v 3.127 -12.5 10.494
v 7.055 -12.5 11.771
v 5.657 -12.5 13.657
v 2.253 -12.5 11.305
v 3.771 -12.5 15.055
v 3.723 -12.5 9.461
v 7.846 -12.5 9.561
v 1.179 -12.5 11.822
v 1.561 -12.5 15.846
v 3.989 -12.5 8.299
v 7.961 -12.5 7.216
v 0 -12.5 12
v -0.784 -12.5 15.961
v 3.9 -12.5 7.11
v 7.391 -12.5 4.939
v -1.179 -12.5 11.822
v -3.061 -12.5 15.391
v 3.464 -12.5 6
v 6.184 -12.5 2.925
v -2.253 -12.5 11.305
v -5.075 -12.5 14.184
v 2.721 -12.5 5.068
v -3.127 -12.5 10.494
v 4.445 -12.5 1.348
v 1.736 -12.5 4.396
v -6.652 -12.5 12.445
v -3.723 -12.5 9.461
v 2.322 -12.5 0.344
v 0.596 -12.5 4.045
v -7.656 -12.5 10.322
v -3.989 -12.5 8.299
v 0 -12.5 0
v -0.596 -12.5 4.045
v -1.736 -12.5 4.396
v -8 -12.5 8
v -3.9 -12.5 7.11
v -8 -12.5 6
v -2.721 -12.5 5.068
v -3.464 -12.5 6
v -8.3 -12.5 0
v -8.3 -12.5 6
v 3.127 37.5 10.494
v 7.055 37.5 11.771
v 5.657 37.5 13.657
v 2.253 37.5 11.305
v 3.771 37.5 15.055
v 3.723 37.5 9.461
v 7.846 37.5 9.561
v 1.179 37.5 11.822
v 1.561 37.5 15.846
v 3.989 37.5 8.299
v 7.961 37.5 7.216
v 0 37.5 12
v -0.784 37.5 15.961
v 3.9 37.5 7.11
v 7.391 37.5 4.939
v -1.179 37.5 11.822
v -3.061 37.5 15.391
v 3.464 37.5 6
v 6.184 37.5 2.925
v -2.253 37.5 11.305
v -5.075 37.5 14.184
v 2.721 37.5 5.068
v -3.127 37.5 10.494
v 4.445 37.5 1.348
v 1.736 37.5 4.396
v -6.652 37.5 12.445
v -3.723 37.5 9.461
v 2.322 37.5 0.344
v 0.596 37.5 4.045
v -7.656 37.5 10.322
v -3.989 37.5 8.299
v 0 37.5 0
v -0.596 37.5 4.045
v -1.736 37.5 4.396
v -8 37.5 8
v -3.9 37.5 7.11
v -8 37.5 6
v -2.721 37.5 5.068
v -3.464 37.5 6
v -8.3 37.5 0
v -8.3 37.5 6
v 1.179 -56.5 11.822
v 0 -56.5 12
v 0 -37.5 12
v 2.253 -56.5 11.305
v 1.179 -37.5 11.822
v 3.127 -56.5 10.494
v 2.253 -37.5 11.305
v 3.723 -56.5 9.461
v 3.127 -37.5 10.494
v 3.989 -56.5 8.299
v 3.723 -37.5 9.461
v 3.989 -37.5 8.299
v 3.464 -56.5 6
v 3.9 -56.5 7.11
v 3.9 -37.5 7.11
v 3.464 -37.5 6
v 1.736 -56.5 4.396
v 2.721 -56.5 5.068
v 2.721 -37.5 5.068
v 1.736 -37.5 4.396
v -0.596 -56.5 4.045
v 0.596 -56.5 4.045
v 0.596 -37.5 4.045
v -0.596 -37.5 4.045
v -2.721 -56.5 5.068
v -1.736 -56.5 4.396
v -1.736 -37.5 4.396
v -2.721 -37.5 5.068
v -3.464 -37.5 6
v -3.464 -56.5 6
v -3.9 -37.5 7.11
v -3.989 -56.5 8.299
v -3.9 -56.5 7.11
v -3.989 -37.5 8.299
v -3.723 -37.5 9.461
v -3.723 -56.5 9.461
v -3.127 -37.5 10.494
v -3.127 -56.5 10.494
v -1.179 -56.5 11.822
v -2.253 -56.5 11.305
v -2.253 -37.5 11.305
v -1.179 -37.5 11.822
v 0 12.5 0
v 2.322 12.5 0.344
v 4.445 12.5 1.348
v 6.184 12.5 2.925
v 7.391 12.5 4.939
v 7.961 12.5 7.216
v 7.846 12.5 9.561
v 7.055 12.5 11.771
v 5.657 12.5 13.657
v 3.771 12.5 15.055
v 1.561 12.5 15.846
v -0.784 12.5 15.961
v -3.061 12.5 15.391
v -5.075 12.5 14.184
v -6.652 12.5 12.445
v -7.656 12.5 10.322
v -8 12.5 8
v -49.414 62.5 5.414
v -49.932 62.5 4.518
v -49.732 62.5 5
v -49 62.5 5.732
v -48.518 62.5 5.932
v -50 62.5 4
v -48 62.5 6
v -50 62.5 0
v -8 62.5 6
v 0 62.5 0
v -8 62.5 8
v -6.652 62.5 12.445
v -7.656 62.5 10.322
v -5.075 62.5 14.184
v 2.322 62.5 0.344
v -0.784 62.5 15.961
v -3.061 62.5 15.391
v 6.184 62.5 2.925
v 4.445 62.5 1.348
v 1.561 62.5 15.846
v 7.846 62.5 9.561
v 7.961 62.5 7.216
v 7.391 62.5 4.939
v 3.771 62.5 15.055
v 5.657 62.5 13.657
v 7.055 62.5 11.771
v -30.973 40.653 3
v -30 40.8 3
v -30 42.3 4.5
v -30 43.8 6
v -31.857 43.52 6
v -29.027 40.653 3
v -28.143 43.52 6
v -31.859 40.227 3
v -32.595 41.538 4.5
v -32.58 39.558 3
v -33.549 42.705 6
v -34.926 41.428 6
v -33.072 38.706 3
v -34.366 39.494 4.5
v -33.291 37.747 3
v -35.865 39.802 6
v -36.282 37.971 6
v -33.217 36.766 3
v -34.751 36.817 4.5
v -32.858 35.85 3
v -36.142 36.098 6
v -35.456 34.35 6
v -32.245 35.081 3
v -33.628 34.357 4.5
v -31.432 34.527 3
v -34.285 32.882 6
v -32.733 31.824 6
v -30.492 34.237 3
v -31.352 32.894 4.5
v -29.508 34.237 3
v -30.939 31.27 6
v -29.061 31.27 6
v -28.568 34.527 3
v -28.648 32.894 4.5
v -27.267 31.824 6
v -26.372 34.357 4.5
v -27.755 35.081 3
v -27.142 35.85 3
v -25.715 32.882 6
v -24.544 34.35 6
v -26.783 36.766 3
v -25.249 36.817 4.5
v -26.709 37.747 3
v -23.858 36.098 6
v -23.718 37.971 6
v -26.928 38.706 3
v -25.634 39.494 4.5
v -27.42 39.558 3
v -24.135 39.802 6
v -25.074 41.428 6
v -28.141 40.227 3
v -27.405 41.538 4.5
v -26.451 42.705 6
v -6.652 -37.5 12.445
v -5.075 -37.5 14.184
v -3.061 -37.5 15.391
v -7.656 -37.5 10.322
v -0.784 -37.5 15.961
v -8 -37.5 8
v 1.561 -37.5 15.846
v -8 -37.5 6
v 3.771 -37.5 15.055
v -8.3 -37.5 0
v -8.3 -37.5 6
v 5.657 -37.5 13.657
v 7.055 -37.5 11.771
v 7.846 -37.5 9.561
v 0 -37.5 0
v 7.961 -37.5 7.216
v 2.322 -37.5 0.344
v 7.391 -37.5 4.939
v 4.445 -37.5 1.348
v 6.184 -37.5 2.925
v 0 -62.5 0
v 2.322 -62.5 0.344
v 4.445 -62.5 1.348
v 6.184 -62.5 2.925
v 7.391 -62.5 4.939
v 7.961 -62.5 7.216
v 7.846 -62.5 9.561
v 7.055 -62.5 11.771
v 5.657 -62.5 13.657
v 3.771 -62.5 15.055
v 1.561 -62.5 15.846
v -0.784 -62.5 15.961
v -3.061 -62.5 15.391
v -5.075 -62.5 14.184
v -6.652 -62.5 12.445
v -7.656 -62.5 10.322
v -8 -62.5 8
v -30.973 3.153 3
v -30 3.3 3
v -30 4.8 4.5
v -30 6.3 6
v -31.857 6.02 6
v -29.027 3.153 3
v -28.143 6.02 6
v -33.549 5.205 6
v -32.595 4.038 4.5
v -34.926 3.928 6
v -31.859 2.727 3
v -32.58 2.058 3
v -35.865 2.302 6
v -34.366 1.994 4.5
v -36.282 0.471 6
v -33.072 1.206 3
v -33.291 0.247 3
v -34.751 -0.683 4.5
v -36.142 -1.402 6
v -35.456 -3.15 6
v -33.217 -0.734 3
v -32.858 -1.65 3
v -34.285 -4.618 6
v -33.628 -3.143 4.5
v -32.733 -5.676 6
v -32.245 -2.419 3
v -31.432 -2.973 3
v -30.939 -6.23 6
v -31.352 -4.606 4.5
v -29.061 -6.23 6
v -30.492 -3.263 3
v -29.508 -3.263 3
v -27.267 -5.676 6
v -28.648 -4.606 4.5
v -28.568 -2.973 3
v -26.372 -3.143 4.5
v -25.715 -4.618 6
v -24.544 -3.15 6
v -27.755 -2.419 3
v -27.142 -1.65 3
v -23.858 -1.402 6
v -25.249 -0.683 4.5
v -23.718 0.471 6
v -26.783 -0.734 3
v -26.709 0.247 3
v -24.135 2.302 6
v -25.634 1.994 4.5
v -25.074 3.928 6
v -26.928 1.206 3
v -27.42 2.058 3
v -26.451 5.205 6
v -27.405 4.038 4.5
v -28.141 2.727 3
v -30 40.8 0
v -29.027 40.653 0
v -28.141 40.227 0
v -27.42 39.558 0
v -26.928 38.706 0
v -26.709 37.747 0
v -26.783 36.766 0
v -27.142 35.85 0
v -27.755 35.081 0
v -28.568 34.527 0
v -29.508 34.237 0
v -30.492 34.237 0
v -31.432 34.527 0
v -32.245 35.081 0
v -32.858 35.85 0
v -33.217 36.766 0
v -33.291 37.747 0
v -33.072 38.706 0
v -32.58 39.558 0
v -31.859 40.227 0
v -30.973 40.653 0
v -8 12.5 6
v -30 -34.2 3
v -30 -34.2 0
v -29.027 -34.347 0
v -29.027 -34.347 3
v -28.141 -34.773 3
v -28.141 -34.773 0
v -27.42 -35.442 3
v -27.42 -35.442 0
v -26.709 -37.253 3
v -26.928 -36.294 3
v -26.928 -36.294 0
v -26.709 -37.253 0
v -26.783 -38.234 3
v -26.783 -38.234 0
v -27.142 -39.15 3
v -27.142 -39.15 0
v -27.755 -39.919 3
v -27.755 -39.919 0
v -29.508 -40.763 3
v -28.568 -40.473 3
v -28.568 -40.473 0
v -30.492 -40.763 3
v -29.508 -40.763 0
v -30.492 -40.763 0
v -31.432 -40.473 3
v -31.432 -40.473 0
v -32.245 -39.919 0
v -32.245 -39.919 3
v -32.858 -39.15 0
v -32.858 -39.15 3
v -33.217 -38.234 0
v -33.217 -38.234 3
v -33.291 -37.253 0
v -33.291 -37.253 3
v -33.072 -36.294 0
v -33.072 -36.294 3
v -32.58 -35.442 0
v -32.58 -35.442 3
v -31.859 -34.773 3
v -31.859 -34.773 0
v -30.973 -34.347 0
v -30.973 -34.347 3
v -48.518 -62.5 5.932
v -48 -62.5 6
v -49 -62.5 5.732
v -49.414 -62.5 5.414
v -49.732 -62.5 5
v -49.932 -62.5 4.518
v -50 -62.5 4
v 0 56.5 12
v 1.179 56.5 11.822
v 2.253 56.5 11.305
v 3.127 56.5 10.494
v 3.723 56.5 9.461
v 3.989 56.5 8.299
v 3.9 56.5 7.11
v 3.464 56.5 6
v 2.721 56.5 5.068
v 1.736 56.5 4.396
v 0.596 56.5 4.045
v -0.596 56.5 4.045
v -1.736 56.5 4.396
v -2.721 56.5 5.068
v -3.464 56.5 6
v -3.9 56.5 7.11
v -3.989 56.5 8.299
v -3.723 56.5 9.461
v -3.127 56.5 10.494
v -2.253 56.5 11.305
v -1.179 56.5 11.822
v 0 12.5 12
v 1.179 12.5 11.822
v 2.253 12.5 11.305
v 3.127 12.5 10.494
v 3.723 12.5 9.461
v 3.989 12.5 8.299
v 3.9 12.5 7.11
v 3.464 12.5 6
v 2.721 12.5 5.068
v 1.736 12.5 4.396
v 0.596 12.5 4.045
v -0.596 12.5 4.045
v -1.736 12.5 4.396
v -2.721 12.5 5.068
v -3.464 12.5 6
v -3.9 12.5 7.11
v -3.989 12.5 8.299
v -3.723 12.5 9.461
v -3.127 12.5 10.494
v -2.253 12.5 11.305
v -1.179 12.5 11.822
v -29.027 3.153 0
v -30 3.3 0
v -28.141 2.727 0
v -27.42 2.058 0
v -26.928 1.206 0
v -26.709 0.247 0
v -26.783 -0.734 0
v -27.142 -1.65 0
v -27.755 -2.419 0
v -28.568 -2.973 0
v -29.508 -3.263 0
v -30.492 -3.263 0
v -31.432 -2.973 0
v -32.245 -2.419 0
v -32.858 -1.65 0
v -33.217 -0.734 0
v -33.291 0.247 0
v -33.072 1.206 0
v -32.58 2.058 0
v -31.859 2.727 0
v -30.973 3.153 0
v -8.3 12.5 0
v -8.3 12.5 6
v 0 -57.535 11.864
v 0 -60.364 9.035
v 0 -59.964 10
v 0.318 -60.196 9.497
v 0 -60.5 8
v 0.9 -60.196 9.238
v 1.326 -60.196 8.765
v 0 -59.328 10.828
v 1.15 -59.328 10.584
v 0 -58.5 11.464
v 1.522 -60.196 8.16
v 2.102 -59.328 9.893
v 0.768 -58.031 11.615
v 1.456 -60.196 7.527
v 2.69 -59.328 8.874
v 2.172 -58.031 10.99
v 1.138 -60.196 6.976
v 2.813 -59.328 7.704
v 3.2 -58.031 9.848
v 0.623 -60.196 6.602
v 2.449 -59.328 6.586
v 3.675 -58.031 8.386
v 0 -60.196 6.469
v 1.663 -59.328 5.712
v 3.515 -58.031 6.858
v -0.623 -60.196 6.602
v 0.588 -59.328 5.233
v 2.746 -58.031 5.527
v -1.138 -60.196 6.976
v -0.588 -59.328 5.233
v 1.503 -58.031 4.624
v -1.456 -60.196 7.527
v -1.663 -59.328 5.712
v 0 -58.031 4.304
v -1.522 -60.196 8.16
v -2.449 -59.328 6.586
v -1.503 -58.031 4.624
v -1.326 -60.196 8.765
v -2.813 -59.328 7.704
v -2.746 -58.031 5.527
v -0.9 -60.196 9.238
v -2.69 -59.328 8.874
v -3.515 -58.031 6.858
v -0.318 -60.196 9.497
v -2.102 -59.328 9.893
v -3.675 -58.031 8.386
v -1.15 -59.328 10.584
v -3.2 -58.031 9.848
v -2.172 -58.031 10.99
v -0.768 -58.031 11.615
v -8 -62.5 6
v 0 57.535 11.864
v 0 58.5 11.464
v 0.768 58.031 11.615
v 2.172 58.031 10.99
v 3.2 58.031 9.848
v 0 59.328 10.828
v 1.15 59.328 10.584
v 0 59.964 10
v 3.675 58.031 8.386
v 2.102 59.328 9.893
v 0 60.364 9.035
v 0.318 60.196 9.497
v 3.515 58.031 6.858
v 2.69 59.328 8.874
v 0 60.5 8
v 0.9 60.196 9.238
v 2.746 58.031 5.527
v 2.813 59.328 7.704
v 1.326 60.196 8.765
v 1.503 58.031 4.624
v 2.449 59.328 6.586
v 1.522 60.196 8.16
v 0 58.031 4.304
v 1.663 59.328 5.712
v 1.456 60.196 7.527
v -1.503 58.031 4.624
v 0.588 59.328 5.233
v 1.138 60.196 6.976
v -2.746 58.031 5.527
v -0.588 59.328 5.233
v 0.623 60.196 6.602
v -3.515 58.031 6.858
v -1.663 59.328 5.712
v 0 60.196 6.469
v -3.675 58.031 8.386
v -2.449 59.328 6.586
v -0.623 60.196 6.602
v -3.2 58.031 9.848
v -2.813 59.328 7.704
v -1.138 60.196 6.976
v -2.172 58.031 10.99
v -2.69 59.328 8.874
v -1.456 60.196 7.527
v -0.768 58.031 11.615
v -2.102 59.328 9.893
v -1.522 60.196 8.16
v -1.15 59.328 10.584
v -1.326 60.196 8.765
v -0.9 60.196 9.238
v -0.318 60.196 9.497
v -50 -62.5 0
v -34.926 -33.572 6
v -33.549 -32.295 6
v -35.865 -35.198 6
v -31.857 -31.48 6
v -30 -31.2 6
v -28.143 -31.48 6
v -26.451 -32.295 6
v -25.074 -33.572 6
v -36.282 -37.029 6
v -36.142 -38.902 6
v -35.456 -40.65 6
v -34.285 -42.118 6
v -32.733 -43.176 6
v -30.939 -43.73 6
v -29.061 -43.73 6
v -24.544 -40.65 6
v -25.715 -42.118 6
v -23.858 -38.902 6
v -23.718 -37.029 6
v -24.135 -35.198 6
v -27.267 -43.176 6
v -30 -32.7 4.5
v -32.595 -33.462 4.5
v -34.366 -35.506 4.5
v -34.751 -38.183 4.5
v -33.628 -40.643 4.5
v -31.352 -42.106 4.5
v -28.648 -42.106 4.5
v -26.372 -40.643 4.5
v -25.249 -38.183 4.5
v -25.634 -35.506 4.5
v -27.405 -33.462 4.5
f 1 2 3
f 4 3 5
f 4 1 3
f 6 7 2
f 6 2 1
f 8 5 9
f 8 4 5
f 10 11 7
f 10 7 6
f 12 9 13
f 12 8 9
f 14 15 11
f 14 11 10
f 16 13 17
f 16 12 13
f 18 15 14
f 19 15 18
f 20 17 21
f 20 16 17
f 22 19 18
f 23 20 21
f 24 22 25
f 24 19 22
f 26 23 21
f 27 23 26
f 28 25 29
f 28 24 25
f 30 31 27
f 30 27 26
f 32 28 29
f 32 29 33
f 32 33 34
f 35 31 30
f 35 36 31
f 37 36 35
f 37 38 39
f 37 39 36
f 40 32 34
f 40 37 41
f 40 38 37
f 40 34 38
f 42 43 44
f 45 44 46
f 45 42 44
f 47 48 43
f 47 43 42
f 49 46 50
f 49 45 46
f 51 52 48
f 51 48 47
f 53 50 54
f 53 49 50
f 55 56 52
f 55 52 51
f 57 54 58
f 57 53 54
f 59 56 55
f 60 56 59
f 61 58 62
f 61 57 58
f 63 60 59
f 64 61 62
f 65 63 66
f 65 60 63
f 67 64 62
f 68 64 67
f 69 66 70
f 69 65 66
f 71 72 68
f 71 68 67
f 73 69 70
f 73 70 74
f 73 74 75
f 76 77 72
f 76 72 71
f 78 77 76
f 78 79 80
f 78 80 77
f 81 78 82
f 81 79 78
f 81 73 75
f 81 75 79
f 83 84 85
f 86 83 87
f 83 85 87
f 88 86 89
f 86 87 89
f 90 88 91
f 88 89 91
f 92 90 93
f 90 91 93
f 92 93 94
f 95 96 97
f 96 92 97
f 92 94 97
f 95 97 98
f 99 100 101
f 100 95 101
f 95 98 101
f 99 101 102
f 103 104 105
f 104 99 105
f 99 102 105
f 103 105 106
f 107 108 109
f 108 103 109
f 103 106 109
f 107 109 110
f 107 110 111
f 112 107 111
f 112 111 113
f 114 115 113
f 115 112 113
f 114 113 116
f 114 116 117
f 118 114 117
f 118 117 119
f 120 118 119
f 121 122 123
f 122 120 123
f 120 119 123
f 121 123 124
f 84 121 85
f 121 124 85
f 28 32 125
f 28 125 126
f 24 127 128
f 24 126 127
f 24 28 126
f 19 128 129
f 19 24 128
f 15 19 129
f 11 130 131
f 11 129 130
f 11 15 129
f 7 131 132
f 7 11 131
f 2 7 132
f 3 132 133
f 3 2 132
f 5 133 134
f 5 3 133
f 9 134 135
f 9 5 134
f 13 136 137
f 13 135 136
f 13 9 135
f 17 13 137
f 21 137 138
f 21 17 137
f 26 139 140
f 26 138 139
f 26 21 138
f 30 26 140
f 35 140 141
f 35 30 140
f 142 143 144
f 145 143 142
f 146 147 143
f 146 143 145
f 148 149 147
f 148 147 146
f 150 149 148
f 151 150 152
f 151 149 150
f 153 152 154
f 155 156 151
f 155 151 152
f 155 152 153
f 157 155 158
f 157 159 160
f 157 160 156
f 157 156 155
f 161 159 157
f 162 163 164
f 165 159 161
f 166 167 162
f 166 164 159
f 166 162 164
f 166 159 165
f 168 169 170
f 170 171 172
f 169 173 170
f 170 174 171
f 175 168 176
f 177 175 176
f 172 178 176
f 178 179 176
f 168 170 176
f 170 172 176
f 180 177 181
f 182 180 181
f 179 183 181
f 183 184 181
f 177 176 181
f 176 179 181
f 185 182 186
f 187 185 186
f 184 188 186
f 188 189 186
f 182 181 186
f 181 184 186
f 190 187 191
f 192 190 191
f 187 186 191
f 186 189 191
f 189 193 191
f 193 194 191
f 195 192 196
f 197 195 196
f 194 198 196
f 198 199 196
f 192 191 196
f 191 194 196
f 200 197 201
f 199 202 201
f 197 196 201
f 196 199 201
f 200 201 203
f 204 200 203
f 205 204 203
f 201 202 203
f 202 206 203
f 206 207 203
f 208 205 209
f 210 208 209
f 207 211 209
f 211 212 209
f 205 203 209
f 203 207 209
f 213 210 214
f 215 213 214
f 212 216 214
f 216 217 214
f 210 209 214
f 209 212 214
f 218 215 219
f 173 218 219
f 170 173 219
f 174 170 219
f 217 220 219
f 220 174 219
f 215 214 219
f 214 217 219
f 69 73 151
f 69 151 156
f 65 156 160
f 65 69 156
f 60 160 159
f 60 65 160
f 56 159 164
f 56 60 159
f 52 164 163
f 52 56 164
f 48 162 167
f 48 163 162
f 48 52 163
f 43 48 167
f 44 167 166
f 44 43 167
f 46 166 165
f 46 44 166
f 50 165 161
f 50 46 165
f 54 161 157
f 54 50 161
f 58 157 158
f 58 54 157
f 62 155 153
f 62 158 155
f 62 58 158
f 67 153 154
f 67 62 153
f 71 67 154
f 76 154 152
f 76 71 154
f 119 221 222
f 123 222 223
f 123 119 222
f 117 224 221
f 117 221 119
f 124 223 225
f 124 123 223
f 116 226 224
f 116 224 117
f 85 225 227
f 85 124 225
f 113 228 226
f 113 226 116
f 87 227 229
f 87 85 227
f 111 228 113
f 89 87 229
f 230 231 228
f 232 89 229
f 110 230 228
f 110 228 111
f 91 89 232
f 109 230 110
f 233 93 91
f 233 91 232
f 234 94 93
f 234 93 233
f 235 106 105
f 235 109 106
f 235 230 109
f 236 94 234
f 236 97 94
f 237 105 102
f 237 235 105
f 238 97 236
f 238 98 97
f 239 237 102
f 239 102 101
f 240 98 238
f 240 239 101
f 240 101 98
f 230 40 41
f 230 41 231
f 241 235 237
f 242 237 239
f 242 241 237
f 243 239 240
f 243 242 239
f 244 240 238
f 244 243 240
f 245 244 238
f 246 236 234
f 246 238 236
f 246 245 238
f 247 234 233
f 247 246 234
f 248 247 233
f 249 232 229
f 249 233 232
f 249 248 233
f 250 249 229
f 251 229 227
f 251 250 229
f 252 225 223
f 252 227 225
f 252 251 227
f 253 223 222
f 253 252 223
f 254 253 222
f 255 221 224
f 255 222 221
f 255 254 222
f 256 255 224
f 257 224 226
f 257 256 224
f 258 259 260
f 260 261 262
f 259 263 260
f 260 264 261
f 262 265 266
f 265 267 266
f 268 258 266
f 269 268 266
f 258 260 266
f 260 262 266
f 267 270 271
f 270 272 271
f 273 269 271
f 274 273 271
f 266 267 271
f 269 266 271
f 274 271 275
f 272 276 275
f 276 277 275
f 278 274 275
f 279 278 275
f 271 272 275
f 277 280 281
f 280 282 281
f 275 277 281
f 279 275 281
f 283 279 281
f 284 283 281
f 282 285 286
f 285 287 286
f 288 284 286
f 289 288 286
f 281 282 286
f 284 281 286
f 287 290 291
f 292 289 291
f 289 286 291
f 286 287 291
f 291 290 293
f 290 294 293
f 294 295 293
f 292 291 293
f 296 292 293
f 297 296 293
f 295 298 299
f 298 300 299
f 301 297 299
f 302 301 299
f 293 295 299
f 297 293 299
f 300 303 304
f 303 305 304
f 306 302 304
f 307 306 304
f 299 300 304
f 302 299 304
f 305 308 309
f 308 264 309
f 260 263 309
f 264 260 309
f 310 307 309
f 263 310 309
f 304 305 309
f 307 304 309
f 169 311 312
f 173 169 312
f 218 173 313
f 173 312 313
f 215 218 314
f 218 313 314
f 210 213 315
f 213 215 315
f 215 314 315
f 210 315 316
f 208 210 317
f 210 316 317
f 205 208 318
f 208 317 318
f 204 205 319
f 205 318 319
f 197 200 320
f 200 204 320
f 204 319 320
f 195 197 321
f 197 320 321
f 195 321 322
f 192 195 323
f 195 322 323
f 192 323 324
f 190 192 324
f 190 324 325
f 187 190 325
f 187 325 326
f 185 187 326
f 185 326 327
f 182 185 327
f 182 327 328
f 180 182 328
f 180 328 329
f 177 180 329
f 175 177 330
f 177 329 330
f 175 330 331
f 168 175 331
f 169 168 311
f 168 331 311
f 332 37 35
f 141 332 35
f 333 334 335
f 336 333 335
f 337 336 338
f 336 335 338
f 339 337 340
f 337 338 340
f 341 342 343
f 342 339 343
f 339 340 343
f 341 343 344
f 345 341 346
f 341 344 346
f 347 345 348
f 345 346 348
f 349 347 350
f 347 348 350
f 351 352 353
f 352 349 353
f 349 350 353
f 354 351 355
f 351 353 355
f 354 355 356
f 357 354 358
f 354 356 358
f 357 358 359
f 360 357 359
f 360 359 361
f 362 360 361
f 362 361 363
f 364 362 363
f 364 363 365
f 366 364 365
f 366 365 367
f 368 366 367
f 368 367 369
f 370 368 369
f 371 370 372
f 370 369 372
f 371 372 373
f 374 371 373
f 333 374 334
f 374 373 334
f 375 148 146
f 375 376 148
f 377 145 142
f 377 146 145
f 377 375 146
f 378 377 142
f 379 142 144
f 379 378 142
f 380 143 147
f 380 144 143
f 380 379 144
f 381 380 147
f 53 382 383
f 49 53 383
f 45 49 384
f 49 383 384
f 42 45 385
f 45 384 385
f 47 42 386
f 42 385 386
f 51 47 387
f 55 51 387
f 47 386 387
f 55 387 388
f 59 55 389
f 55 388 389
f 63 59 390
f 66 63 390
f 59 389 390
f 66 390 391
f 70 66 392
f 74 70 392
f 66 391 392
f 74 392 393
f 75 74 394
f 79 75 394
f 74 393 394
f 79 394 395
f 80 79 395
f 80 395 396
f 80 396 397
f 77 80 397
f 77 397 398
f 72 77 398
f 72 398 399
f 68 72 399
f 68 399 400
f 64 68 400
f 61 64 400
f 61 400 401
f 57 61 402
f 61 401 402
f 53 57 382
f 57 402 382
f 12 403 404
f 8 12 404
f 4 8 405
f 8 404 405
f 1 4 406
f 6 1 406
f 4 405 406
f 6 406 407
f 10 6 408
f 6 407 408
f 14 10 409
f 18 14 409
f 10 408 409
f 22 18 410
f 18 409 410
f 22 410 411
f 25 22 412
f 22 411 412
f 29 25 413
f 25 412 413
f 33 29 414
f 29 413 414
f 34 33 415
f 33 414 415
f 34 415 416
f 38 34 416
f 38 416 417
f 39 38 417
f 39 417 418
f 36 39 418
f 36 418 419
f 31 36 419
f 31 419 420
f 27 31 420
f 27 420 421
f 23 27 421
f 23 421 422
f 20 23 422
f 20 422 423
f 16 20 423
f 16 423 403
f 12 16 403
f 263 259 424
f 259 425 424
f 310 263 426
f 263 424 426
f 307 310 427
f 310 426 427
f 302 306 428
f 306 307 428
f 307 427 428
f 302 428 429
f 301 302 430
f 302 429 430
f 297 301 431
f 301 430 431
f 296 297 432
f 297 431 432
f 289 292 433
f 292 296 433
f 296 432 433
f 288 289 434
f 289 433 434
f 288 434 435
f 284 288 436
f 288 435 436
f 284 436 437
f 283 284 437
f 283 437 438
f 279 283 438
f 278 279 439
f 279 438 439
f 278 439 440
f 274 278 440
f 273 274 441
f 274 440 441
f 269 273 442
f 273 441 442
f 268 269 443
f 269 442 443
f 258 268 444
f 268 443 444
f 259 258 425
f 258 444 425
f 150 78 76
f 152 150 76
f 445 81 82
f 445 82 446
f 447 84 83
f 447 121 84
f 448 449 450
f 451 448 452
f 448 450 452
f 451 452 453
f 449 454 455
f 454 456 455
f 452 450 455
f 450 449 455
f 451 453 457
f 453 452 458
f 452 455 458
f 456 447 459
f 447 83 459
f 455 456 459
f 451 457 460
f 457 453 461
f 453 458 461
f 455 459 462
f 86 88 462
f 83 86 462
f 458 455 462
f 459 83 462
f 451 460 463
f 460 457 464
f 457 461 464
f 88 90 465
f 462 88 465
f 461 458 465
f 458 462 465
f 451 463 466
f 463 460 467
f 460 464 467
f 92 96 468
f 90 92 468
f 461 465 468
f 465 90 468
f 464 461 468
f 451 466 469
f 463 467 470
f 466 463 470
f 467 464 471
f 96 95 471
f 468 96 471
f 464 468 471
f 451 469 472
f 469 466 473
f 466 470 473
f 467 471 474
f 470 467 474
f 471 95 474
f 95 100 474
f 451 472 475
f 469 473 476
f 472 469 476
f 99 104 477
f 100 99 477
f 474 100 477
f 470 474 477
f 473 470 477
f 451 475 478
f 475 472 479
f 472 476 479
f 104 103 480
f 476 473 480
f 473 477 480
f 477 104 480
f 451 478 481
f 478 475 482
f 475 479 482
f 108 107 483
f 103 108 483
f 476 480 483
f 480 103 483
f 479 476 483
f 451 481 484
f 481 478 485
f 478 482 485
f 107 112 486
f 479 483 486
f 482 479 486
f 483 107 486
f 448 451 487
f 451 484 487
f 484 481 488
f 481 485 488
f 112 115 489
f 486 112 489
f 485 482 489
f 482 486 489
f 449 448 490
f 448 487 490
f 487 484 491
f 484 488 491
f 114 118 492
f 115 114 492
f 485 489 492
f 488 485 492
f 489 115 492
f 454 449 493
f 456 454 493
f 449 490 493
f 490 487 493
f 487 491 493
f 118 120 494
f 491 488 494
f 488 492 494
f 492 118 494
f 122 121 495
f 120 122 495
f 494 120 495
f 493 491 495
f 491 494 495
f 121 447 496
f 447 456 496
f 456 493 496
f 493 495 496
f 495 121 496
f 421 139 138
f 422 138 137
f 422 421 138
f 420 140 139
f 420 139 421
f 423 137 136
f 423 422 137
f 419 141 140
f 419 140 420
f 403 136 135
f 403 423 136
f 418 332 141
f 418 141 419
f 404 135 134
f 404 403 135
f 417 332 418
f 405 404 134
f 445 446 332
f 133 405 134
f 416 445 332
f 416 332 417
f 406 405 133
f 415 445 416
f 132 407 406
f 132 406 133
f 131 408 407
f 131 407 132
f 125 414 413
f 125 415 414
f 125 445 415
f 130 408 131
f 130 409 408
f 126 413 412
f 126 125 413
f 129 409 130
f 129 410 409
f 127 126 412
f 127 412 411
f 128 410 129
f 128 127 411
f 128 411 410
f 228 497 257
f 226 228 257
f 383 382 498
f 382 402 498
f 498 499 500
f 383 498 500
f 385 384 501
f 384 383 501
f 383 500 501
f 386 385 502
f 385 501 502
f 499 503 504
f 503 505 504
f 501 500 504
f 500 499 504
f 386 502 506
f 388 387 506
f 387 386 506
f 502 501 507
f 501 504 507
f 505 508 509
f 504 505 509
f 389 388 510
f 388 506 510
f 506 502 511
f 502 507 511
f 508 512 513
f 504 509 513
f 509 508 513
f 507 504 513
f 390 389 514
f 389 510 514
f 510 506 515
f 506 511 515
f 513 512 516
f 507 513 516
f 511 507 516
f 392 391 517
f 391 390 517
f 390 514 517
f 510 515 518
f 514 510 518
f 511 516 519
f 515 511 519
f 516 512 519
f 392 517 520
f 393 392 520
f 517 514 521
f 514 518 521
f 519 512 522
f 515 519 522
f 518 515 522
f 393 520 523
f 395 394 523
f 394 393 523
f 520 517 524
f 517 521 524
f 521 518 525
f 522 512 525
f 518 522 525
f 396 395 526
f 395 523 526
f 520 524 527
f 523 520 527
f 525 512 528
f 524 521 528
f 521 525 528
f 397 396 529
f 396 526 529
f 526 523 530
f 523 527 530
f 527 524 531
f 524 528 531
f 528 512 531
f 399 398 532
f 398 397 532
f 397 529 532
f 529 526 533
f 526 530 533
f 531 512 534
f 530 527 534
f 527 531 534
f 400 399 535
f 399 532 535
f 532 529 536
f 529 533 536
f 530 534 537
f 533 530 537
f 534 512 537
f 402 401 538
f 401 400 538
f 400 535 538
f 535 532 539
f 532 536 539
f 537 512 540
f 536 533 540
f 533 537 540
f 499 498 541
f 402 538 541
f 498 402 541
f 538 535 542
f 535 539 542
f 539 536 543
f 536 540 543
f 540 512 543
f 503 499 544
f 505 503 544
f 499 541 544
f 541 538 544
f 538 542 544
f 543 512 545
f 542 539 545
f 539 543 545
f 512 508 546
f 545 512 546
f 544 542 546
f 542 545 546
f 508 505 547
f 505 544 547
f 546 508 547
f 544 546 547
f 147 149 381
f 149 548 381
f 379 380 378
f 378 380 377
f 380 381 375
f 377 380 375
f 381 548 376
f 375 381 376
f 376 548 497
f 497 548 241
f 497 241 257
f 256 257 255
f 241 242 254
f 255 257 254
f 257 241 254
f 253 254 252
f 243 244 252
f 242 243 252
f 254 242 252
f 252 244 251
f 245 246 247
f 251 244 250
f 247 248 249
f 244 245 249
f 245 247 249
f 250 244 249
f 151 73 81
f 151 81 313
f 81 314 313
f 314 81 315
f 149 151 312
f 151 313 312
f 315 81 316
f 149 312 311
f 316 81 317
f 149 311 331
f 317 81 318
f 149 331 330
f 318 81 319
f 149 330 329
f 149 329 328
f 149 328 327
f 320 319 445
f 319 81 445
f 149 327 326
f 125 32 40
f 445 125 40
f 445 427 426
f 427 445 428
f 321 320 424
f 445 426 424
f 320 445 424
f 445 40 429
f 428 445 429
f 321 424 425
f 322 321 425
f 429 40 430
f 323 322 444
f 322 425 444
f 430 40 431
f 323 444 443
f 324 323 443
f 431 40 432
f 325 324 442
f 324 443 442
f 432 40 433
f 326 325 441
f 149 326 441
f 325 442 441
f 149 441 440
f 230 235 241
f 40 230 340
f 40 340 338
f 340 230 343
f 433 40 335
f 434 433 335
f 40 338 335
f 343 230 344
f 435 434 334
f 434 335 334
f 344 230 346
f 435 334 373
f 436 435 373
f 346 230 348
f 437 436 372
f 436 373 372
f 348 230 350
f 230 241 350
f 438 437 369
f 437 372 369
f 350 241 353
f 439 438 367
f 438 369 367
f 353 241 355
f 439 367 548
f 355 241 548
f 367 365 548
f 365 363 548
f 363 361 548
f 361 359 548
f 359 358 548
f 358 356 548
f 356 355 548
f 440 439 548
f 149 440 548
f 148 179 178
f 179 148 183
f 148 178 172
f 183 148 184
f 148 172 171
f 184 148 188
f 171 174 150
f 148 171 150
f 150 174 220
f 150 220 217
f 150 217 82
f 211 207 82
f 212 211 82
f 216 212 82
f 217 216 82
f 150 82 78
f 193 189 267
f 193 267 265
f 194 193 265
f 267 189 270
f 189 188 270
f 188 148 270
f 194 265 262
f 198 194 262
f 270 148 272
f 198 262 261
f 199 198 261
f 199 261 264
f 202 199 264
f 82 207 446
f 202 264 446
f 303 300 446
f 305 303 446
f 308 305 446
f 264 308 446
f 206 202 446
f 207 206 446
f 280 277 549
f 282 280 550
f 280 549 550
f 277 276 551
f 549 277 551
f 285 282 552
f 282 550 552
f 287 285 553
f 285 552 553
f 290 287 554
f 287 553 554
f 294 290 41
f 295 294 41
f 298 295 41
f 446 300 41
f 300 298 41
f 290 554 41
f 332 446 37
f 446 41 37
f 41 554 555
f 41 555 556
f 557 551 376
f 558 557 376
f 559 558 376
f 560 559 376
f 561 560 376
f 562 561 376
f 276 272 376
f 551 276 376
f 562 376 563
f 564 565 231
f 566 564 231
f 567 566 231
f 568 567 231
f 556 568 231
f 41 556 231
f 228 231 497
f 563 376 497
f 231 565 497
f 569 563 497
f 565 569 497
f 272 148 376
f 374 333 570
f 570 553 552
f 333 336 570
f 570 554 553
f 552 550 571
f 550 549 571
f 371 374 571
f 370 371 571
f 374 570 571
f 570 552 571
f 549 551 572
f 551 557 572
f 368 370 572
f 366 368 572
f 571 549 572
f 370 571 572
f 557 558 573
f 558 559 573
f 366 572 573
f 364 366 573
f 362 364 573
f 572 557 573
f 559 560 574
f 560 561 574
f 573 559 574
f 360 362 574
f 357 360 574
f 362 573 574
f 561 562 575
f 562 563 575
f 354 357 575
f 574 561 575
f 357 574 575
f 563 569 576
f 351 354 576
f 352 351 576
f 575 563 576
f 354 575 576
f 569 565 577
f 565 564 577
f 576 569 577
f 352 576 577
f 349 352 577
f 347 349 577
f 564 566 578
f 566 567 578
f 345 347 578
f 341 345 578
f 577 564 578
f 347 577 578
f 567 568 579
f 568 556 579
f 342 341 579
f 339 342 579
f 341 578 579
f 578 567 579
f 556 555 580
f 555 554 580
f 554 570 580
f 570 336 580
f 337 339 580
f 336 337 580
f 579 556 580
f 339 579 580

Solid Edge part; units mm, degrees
sketch "Sketch1" plane through (0, 0, 0) normal (0, -1, 0) x (1, 0, 0)
  line L0 (-50, 0) -> (-50, 4)
  arc A0 (-50, 4) -> (-48, 6) centre (-48, 4) cw
  line L1 (-48, 6) -> (-8, 6)
  line L2 (-8, 6) -> (-8, 8)
  arc A1 (-8, 8) -> (0, 0) centre (0, 8) cw
  line L3 (0, 0) -> (-50, 0)
extrude "ExtrudedProtrusion_1" add sketch "Sketch1" against normal blind 62.5 and the other way blind 62.5
sketch "Sketch2" plane through (0, 0, 0) normal (0, 0, 1) x (1, 0, 0)
  line L0 (-8.3, 37.5) -> (-8.3, 12.5)
  line L1 (-8.3, 12.5) -> (16, 12.5)
  line L2 (16, 12.5) -> (16, -12.5)
  line L3 (16, -12.5) -> (-8.3, -12.5)
  line L4 (-8.3, -12.5) -> (-8.3, -37.5)
  line L5 (-8.3, -37.5) -> (21, -37.5)
  line L6 (21, -37.5) -> (21, 37.5)
  line L7 (21, 37.5) -> (-8.3, 37.5)
extrude "ExtrudedCutout_1" cut sketch "Sketch2" along normal blind 16
sketch "Sketch3" plane through (-30, 0, 0) normal (1, 0, 0) x (0, 1, 0)
  line L0 (37.5, 6) -> (43.8, 6)
  line L1 (43.8, 6) -> (40.8, 3)
  line L2 (40.8, 3) -> (40.8, 0)
  line L3 (40.8, 0) -> (37.5, 0)
  line L4 (37.5, 0) -> (37.5, 6)
revolve "RevolvedCutout1" cut sketch "Sketch3" angle 360 about axis through (-30, 37.5, 0) along (0, 0, 1)
sketch "Sketch4" plane through (-30, 0, 0) normal (1, 0, 0) x (0, 1, 0)
  line L0 (-37.5, 6) -> (-31.2, 6)
  line L1 (-31.2, 6) -> (-34.2, 3)
  line L2 (-34.2, 3) -> (-34.2, 0)
  line L3 (-34.2, 0) -> (-37.5, 0)
  line L4 (-37.5, 0) -> (-37.5, 6)
revolve "RevolvedCutout2" cut sketch "Sketch4" angle 360 about axis through (-30, -37.5, 0) along (0, 0, 1)
sketch "Sketch5" plane through (-30, 0, 0) normal (1, 0, 0) x (0, 1, 0)
  line L0 (0, 6) -> (6.3, 6)
  line L1 (6.3, 6) -> (3.3, 3)
  line L2 (3.3, 3) -> (3.3, 0)
  line L3 (3.3, 0) -> (0, 0)
  line L4 (0, 0) -> (0, 6)
revolve "RevolvedCutout3" cut sketch "Sketch5" angle 360 about axis through (-30, 0, 0) along (0, 0, 1)
sketch "Sketch6" plane through (0, 0, 0) normal (1, 0, 0) x (0, 1, 0)
  arc A0 (-60.5, 8) -> (-56.5, 12) centre (-56.5, 8) cw
  line L0 (-56.5, 12) -> (56.5, 12)
  arc A1 (56.5, 12) -> (60.5, 8) centre (56.5, 8) cw
  line L1 (60.5, 8) -> (-60.5, 8)
revolve "RevolvedCutout4" cut sketch "Sketch6" angle 360 about axis through (0, 60.5, 8) along (0, -1, 0)
